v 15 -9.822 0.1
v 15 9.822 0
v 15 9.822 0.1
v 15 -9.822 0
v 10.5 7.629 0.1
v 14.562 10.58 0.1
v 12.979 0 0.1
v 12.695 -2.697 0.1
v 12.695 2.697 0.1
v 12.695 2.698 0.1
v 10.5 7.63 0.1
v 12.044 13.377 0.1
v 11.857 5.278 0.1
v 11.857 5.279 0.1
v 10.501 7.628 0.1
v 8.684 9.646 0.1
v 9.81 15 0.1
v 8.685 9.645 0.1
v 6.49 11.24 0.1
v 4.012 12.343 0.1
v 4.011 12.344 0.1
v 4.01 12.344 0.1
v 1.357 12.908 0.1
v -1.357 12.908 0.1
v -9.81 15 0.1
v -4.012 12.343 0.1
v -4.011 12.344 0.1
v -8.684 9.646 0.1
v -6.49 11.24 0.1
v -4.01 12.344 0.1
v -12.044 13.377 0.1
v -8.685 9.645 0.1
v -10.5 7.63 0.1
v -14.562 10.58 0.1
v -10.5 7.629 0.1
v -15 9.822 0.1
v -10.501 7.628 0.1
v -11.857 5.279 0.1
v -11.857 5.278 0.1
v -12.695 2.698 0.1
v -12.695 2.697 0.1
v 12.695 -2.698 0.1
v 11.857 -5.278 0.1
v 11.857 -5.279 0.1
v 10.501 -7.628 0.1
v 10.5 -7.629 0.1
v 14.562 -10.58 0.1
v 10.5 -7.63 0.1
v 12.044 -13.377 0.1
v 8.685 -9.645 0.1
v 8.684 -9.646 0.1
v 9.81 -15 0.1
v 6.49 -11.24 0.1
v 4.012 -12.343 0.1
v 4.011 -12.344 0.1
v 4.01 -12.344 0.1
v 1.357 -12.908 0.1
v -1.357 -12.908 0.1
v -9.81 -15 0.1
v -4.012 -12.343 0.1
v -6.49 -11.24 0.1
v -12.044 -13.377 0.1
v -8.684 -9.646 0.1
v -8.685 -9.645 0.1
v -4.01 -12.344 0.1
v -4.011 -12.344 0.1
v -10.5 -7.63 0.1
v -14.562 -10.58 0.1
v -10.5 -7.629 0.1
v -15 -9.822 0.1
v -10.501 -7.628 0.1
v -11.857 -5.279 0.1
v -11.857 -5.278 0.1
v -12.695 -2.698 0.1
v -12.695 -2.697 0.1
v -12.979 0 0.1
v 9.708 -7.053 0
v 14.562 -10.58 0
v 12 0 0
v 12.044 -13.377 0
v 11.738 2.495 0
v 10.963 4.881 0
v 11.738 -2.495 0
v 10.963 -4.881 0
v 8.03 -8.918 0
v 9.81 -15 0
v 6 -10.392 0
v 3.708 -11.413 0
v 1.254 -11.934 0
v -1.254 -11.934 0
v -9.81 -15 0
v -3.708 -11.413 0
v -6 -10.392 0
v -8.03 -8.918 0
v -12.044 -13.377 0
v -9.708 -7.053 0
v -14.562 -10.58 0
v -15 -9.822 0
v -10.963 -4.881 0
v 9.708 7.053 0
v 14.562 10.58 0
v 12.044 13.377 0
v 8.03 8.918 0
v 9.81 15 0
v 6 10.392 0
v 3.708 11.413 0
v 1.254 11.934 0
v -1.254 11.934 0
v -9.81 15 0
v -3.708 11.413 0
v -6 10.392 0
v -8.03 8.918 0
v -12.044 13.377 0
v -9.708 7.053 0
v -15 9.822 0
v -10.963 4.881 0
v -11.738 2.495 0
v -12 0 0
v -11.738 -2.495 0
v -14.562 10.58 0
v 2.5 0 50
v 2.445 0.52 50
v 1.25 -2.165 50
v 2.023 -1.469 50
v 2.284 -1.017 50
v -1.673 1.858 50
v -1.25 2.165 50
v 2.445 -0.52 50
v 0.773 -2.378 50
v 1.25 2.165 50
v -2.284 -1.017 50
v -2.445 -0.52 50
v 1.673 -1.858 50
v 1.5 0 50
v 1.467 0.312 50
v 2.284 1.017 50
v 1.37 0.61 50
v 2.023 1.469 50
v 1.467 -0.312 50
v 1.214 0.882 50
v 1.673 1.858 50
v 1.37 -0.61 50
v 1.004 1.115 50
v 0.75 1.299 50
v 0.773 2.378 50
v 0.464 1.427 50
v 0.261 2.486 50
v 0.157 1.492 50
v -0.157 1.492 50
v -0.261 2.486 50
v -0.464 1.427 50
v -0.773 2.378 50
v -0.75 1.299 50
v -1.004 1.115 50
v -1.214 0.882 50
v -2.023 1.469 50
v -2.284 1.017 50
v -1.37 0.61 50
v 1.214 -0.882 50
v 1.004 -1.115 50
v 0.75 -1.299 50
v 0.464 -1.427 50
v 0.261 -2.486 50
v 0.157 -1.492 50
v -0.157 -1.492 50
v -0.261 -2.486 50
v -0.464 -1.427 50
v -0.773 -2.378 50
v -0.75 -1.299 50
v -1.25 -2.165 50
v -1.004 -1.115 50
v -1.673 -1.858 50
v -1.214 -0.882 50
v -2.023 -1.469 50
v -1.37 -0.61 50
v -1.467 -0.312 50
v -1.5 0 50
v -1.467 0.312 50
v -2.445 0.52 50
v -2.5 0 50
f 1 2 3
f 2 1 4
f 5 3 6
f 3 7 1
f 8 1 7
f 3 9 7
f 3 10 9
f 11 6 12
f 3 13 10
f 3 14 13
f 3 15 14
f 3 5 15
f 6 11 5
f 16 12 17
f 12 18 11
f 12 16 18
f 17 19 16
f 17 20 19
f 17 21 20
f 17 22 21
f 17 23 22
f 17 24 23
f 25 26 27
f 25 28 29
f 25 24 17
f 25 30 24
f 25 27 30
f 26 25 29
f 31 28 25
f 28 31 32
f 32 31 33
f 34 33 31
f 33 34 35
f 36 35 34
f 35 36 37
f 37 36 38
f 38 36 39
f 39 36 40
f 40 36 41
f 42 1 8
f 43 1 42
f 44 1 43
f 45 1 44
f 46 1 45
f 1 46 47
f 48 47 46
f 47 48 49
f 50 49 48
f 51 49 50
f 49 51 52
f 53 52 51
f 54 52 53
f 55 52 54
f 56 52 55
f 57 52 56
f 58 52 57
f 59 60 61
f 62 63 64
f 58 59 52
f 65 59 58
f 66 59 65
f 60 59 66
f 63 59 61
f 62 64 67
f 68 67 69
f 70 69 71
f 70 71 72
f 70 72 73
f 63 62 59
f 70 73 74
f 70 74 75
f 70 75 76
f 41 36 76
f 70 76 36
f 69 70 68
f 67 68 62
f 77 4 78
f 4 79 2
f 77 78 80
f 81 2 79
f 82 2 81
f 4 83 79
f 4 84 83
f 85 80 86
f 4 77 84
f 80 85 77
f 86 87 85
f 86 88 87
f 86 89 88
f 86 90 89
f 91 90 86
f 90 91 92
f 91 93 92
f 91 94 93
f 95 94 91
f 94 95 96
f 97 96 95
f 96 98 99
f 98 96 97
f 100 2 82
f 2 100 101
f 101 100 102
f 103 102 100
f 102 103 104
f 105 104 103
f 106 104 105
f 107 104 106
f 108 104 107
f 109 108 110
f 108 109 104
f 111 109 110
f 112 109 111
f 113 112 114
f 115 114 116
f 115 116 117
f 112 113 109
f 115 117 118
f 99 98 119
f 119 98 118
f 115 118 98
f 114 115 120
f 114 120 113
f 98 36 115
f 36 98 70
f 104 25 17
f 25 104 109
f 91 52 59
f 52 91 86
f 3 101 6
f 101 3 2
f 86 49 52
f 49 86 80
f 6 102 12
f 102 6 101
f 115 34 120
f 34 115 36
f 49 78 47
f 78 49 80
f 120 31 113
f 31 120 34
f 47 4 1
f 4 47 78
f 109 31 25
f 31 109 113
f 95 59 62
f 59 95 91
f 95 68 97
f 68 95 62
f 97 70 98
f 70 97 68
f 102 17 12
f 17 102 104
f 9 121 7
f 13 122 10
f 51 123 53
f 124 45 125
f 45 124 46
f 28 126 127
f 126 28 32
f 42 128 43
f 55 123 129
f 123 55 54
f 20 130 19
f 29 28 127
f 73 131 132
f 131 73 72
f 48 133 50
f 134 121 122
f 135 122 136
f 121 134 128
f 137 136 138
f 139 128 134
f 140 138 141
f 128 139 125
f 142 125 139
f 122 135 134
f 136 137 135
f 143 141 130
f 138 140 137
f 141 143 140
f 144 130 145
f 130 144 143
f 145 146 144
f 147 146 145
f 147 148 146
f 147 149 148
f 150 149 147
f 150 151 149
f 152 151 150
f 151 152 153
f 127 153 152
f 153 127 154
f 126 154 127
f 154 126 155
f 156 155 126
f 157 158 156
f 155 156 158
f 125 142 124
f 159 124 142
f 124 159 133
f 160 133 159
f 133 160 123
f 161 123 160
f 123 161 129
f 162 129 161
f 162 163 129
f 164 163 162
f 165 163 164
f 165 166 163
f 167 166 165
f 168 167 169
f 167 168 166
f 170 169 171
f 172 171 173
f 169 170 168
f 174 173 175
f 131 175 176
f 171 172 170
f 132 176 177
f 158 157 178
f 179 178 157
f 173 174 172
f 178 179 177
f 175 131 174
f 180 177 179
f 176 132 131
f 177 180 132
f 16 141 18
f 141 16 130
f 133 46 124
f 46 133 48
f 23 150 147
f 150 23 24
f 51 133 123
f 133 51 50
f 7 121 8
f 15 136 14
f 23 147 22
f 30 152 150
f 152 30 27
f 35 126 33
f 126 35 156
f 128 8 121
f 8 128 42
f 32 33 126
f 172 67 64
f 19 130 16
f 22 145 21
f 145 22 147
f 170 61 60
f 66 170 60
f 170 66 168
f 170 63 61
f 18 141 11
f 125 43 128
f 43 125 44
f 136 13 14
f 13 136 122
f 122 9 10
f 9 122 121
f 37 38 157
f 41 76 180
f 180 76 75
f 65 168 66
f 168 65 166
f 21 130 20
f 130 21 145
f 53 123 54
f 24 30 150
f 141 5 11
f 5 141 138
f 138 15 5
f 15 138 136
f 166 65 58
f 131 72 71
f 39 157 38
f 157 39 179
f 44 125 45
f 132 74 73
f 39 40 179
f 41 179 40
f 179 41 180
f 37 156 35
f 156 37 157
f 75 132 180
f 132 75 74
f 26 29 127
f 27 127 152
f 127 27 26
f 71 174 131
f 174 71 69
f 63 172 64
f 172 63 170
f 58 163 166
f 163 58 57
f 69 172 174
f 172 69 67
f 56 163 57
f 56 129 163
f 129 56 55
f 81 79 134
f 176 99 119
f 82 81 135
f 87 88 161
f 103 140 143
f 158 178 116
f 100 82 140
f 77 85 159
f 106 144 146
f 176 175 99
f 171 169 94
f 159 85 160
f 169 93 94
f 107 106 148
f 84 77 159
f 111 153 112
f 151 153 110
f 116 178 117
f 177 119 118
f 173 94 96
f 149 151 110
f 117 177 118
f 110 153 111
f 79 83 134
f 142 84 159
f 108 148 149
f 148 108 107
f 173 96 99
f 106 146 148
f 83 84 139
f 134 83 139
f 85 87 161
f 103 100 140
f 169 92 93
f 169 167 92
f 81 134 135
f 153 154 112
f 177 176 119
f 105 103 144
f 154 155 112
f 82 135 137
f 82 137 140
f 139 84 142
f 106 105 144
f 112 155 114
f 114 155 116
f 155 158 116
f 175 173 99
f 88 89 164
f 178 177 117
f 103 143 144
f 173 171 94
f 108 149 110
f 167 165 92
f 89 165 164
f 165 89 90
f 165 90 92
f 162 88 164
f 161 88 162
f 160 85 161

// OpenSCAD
height = 50;
base_width = 30;
top_width = 5;
base_height = 0.1;
wall_thickness = 1;

difference() {
    union() {
        intersection() {
            translate([-base_width/2,-base_width/2,0]) cube([base_width,base_width,base_height]);
            cylinder(r=0.6*base_width,h=base_height);
        }
        cylinder(r1=base_width/2-2*wall_thickness, r2=top_width/2, h=height);
    }
    cylinder(r1=base_width/2-3*wall_thickness, r2=top_width/2-wall_thickness, h=height);
}
